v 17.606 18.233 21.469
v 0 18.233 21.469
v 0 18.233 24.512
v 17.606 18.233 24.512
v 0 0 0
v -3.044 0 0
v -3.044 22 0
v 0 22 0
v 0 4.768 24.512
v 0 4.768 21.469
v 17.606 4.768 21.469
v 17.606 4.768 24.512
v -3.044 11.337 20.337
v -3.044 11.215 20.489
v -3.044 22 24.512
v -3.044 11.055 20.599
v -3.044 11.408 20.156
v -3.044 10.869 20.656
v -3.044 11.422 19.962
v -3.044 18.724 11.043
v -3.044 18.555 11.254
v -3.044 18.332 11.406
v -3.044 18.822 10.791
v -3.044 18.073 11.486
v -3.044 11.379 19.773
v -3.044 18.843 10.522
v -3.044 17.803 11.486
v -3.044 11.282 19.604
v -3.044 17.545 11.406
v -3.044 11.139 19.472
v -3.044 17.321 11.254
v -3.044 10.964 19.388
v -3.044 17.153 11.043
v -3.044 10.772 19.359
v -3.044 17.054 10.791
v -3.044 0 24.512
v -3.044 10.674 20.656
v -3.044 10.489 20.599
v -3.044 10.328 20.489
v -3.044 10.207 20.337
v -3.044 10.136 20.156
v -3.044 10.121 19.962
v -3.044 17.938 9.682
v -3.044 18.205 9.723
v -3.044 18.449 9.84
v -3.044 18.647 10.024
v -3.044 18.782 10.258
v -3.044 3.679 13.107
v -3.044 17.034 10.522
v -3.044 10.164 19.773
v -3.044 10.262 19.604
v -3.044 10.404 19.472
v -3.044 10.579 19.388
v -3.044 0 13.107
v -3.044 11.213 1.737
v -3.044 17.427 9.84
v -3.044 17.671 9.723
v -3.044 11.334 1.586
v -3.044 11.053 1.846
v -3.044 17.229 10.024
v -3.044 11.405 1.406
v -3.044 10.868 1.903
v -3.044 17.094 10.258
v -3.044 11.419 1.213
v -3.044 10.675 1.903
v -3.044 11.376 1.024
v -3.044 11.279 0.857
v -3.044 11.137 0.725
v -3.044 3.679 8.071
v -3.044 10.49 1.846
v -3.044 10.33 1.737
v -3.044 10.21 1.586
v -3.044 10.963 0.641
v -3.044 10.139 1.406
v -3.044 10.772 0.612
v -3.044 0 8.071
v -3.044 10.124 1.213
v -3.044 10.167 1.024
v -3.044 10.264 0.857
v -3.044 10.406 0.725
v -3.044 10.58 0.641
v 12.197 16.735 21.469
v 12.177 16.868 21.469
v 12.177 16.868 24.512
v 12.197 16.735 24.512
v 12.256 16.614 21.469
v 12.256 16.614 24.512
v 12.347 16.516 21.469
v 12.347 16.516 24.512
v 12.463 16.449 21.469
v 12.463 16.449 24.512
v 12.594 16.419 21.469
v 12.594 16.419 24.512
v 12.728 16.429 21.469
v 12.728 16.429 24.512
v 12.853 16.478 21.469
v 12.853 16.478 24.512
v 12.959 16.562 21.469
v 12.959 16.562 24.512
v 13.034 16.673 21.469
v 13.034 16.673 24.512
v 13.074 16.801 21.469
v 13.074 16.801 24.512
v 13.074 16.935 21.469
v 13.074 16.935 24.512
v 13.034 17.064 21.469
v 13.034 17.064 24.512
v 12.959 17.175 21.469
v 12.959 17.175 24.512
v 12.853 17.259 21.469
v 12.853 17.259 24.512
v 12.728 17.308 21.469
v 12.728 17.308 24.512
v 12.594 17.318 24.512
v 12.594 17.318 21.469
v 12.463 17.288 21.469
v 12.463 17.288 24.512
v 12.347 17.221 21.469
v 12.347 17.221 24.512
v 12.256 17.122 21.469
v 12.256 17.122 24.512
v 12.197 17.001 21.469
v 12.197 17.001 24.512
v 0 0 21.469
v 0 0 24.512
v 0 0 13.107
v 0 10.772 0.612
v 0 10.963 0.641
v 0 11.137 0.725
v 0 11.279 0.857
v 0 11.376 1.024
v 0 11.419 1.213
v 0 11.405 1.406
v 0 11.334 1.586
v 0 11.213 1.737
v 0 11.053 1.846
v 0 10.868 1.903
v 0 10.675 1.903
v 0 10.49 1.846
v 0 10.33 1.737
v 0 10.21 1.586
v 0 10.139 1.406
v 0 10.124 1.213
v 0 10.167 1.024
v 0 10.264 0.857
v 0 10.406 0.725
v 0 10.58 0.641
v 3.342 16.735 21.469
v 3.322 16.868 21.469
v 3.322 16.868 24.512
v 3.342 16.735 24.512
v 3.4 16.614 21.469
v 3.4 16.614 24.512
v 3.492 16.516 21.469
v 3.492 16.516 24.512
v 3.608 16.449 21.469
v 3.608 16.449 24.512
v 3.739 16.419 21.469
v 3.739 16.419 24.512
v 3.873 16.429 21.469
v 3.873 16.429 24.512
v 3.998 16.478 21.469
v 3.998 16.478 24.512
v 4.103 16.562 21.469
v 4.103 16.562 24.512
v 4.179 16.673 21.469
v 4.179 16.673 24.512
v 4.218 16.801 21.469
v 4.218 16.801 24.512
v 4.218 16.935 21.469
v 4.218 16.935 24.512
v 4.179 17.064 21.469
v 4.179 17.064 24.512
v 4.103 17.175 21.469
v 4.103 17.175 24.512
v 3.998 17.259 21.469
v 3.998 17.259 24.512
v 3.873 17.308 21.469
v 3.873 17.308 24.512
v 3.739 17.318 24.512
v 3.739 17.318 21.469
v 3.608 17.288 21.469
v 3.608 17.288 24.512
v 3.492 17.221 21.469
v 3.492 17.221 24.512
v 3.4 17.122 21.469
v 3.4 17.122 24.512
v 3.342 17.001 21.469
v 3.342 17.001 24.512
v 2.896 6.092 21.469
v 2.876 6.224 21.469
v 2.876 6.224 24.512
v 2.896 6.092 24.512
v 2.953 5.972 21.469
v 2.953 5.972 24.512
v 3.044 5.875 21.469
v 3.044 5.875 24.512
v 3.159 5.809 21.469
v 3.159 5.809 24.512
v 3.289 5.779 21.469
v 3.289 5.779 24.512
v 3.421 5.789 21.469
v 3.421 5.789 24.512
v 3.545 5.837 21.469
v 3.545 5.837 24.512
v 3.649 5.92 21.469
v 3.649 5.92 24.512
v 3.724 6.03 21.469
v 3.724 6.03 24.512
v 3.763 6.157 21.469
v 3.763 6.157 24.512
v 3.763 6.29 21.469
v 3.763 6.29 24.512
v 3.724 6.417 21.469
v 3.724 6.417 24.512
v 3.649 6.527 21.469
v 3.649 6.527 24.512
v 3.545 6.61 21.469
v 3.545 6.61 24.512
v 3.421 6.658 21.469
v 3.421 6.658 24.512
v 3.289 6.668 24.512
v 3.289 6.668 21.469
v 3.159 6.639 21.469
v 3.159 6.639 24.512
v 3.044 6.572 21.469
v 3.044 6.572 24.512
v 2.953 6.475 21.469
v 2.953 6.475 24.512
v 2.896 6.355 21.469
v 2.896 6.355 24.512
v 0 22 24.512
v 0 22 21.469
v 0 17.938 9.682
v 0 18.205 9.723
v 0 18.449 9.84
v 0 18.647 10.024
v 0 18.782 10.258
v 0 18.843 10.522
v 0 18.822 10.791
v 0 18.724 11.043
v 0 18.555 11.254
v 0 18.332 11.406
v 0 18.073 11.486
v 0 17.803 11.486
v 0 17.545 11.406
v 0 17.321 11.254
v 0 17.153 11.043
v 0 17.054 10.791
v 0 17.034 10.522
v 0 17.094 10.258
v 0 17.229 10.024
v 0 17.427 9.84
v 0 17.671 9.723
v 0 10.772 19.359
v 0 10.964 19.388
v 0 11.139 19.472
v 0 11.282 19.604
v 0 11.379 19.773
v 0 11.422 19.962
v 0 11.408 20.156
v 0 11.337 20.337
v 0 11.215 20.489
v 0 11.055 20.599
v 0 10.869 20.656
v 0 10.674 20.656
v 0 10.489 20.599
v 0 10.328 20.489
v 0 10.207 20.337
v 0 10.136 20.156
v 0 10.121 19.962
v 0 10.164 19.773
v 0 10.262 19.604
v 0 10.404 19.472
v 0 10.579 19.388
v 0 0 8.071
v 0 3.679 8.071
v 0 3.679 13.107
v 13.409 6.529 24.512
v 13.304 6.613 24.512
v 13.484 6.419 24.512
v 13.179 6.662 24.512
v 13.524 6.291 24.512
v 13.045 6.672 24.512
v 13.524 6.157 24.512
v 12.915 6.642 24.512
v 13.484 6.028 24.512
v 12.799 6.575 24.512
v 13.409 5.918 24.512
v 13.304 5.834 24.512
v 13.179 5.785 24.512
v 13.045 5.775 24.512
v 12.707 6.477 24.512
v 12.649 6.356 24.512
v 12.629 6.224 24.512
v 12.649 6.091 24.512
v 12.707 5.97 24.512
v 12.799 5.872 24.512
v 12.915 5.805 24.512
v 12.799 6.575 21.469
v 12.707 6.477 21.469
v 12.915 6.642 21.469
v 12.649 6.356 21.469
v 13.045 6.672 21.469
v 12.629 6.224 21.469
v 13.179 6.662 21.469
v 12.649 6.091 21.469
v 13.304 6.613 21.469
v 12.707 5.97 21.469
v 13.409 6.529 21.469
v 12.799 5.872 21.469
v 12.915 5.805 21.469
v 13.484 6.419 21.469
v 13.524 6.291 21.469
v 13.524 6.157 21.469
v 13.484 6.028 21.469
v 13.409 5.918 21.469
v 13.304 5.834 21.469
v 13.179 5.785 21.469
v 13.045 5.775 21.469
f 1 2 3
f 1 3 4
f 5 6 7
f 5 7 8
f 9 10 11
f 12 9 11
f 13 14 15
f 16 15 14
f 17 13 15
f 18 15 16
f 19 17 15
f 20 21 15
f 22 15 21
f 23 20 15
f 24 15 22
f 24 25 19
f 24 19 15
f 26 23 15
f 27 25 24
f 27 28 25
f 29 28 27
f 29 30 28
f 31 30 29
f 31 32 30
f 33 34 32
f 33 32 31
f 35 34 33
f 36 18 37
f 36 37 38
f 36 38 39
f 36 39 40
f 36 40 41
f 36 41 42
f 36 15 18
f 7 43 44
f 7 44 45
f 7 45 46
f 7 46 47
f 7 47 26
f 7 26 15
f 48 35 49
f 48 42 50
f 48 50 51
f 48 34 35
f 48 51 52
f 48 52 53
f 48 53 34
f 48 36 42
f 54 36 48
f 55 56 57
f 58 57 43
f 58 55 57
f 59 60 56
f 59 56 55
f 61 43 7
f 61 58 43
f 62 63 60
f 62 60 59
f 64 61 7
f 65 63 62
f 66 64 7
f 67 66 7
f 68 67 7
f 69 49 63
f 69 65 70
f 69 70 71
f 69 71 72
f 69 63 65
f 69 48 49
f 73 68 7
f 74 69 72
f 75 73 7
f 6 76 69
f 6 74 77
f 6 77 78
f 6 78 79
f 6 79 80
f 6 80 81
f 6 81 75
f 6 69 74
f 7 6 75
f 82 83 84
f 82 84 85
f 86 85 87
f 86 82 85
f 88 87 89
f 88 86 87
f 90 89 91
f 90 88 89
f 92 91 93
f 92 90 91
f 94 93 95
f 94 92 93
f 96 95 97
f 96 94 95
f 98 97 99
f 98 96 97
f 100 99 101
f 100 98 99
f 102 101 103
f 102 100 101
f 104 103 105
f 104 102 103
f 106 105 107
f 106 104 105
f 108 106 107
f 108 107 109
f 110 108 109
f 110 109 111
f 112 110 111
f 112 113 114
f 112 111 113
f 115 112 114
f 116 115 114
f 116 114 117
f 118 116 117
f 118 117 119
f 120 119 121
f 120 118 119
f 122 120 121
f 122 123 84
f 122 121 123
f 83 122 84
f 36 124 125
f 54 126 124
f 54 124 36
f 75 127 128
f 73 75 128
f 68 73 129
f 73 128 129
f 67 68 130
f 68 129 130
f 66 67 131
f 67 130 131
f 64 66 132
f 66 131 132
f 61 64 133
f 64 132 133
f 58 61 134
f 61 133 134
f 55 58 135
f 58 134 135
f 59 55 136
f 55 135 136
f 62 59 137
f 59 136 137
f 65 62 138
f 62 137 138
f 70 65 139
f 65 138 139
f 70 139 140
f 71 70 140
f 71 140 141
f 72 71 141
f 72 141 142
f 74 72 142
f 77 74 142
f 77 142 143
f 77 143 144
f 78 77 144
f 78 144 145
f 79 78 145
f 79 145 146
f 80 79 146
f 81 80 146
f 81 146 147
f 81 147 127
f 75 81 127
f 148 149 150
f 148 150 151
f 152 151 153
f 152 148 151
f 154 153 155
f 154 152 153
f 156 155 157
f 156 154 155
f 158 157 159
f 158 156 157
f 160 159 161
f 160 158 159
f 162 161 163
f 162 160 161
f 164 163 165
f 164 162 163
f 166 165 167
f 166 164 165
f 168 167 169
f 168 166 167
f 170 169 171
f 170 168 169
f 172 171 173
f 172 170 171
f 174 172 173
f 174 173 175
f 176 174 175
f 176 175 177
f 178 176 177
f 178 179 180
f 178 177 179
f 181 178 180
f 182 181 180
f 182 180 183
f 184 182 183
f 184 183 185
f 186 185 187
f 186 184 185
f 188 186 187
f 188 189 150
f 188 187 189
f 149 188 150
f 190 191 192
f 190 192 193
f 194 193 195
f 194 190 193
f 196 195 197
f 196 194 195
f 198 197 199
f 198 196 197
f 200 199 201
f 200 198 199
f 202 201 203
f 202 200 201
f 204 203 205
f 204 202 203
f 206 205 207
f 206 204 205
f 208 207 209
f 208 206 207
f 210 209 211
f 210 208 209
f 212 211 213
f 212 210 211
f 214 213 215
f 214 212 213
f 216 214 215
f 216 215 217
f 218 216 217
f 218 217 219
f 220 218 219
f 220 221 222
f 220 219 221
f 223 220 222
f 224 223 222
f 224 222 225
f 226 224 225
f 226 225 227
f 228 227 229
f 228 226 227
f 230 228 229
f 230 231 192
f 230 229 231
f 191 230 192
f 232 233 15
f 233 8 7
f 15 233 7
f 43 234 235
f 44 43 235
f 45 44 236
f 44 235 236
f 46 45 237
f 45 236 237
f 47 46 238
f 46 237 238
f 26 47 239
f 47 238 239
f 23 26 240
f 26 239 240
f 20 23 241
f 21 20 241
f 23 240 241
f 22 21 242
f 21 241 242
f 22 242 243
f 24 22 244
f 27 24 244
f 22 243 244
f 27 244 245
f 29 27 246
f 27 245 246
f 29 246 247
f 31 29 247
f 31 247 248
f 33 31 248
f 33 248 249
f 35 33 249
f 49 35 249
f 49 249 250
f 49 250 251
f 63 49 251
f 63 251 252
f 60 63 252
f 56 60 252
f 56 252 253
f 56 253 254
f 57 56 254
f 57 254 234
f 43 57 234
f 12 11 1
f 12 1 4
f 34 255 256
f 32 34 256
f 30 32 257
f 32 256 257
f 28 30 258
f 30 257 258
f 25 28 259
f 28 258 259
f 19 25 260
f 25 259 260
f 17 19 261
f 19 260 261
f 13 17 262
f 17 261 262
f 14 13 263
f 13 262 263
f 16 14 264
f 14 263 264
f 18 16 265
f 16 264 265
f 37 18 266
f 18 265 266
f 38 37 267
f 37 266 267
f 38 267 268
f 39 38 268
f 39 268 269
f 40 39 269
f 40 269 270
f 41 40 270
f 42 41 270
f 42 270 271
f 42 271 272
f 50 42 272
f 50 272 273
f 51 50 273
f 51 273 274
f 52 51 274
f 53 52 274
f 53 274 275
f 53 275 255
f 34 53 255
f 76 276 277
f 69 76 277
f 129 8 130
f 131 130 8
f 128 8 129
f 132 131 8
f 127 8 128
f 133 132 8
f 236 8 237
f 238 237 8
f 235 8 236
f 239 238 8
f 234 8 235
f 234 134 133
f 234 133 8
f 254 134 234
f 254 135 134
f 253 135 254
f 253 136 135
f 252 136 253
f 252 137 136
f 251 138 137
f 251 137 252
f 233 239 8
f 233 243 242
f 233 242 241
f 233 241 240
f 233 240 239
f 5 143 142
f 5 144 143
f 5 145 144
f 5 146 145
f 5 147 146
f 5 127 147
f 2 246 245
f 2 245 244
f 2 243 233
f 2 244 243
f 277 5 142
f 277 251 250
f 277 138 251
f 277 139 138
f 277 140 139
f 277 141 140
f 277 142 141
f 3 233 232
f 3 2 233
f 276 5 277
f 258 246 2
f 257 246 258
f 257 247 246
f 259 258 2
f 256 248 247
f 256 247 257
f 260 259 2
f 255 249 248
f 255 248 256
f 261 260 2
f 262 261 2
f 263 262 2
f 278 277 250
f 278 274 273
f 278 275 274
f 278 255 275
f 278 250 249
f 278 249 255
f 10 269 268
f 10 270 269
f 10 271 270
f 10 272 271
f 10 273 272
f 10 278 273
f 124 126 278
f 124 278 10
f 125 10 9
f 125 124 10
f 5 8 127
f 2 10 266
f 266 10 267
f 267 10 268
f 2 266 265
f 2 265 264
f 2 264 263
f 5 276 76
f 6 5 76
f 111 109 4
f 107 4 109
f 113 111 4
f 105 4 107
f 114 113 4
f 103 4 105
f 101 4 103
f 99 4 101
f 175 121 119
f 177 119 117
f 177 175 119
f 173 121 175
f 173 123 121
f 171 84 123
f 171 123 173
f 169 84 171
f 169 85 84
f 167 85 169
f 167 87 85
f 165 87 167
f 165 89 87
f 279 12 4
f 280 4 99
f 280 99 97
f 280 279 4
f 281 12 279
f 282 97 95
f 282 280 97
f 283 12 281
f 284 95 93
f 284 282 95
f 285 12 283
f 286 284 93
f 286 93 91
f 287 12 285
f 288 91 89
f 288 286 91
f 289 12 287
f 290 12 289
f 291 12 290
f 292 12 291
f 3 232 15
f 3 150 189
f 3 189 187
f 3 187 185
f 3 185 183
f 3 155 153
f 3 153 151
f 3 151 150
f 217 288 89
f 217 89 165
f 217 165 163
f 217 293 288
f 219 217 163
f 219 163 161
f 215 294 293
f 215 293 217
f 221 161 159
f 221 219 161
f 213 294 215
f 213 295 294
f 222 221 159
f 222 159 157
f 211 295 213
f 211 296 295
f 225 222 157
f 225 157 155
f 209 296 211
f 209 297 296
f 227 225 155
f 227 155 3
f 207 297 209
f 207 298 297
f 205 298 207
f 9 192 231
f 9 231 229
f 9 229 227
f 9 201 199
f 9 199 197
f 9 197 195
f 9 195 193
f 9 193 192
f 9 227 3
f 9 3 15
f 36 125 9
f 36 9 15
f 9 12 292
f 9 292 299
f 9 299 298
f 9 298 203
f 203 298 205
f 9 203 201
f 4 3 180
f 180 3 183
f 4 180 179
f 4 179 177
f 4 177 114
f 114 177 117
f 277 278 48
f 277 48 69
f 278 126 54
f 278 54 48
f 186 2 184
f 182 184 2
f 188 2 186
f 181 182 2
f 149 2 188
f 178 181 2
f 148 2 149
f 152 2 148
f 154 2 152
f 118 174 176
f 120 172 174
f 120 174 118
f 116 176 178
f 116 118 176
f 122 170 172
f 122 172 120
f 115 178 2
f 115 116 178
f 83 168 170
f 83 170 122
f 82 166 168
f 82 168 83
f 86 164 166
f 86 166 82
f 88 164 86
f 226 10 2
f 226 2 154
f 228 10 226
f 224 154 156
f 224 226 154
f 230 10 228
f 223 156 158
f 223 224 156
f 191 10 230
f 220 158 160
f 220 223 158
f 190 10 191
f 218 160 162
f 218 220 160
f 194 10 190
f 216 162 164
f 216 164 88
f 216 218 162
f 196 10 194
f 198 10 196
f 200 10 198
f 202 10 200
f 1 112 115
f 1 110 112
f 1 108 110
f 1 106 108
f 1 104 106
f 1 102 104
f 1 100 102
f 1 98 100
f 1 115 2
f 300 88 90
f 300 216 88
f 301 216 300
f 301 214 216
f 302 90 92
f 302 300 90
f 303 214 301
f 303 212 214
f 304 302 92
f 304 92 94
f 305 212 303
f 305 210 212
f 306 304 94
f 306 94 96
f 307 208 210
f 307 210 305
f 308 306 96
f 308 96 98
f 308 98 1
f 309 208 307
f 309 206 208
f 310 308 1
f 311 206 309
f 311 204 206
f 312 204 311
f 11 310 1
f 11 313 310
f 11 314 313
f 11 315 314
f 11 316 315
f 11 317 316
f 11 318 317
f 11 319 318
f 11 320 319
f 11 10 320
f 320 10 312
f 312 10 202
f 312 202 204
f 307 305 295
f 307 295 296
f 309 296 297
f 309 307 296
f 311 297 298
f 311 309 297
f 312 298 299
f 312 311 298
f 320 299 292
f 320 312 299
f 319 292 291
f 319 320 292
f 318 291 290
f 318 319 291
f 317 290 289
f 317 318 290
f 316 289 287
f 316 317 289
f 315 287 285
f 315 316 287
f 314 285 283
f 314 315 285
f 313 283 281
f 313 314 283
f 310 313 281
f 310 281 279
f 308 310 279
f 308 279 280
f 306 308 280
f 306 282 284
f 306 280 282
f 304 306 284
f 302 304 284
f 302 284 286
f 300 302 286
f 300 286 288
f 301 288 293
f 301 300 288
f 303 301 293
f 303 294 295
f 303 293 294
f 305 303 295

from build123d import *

# Parameters (mm, degrees)
EXTRUDE_THIN1_DEPTH = 22
SKETCH4_R           = 0.649105381
SKETCH4_R_2         = 0.65234644
SKETCH4_R_3         = 0.906952967
SKETCH4_W           = 5.036303432
SKETCH4_H           = 5.470796117
CUT_EXTRUDE2_DEPTH  = 38.347454818
SKETCH8_R           = 0.450837693
SKETCH8_R_2         = 0.449707116
SKETCH8_R_3         = 0.445855953
CUT_EXTRUDE5_DEPTH  = 38.347454818
SKETCH9_W           = 17.606045563
SKETCH9_H           = 3.76709992
SKETCH9_H_2         = 4.767878547
CUT_EXTRUDE6_DEPTH  = 38.347454818


with BuildPart() as part:
    # Sketch2 → Extrude-Thin1 (new body)
    with BuildSketch(Plane(origin=(0, 0, 0), x_dir=(1, 0, 0), z_dir=(0, 1, 0))):
        Polygon((0, 0), (0, -21.46884451), (17.606045563, -21.46884451), (17.606045563, -24.512436456), (-3.043591946, -24.512436456), (-3.043591946, 0), align=None)
    extrude(amount=EXTRUDE_THIN1_DEPTH)

    # Sketch4 → Cut-Extrude2 (cut, through all)
    with BuildSketch(Plane(origin=(0, 0, 0), x_dir=(0, 0, -1), z_dir=(1, 0, 0))):
        with Locations((-1.261501122, 10.771672365)):
            Circle(SKETCH4_R)
        with Locations((-20.011001783, 10.771672365)):
            Circle(SKETCH4_R_2)
        with Locations((-10.589323514, 17.938155066)):
            Circle(SKETCH4_R_3)
        with Locations((-10.589323514, 0.943208514)):
            Rectangle(SKETCH4_W, SKETCH4_H)
    extrude(amount=-CUT_EXTRUDE2_DEPTH, mode=Mode.SUBTRACT)

    # Sketch8 → Cut-Extrude5 (cut, through all)
    with BuildSketch(Plane.XY):
        with Locations(Location((3.77269277, 16.868201952, 0), (0, 0, 180))):
            Circle(SKETCH8_R)
        with Locations(Location((12.628067292, 16.868201952, 0), (0, 0, 180))):
            Circle(SKETCH8_R)
        with Locations(Location((13.078904985, 6.223556551, 0), (0, 0, 180))):
            Circle(SKETCH8_R_2)
        with Locations(Location((3.321855077, 6.223556551, 0), (0, 0, 180))):
            Circle(SKETCH8_R_3)
    extrude(amount=CUT_EXTRUDE5_DEPTH, mode=Mode.SUBTRACT)

    # Sketch9 → Cut-Extrude6 (cut, through all)
    with BuildSketch(Plane.XY):
        with Locations((8.803022782, 20.11645004)):
            Rectangle(SKETCH9_W, SKETCH9_H)
        with Locations((8.803022782, 2.383939274)):
            Rectangle(SKETCH9_W, SKETCH9_H_2)
    extrude(amount=CUT_EXTRUDE6_DEPTH, mode=Mode.SUBTRACT)


solid = part.part
